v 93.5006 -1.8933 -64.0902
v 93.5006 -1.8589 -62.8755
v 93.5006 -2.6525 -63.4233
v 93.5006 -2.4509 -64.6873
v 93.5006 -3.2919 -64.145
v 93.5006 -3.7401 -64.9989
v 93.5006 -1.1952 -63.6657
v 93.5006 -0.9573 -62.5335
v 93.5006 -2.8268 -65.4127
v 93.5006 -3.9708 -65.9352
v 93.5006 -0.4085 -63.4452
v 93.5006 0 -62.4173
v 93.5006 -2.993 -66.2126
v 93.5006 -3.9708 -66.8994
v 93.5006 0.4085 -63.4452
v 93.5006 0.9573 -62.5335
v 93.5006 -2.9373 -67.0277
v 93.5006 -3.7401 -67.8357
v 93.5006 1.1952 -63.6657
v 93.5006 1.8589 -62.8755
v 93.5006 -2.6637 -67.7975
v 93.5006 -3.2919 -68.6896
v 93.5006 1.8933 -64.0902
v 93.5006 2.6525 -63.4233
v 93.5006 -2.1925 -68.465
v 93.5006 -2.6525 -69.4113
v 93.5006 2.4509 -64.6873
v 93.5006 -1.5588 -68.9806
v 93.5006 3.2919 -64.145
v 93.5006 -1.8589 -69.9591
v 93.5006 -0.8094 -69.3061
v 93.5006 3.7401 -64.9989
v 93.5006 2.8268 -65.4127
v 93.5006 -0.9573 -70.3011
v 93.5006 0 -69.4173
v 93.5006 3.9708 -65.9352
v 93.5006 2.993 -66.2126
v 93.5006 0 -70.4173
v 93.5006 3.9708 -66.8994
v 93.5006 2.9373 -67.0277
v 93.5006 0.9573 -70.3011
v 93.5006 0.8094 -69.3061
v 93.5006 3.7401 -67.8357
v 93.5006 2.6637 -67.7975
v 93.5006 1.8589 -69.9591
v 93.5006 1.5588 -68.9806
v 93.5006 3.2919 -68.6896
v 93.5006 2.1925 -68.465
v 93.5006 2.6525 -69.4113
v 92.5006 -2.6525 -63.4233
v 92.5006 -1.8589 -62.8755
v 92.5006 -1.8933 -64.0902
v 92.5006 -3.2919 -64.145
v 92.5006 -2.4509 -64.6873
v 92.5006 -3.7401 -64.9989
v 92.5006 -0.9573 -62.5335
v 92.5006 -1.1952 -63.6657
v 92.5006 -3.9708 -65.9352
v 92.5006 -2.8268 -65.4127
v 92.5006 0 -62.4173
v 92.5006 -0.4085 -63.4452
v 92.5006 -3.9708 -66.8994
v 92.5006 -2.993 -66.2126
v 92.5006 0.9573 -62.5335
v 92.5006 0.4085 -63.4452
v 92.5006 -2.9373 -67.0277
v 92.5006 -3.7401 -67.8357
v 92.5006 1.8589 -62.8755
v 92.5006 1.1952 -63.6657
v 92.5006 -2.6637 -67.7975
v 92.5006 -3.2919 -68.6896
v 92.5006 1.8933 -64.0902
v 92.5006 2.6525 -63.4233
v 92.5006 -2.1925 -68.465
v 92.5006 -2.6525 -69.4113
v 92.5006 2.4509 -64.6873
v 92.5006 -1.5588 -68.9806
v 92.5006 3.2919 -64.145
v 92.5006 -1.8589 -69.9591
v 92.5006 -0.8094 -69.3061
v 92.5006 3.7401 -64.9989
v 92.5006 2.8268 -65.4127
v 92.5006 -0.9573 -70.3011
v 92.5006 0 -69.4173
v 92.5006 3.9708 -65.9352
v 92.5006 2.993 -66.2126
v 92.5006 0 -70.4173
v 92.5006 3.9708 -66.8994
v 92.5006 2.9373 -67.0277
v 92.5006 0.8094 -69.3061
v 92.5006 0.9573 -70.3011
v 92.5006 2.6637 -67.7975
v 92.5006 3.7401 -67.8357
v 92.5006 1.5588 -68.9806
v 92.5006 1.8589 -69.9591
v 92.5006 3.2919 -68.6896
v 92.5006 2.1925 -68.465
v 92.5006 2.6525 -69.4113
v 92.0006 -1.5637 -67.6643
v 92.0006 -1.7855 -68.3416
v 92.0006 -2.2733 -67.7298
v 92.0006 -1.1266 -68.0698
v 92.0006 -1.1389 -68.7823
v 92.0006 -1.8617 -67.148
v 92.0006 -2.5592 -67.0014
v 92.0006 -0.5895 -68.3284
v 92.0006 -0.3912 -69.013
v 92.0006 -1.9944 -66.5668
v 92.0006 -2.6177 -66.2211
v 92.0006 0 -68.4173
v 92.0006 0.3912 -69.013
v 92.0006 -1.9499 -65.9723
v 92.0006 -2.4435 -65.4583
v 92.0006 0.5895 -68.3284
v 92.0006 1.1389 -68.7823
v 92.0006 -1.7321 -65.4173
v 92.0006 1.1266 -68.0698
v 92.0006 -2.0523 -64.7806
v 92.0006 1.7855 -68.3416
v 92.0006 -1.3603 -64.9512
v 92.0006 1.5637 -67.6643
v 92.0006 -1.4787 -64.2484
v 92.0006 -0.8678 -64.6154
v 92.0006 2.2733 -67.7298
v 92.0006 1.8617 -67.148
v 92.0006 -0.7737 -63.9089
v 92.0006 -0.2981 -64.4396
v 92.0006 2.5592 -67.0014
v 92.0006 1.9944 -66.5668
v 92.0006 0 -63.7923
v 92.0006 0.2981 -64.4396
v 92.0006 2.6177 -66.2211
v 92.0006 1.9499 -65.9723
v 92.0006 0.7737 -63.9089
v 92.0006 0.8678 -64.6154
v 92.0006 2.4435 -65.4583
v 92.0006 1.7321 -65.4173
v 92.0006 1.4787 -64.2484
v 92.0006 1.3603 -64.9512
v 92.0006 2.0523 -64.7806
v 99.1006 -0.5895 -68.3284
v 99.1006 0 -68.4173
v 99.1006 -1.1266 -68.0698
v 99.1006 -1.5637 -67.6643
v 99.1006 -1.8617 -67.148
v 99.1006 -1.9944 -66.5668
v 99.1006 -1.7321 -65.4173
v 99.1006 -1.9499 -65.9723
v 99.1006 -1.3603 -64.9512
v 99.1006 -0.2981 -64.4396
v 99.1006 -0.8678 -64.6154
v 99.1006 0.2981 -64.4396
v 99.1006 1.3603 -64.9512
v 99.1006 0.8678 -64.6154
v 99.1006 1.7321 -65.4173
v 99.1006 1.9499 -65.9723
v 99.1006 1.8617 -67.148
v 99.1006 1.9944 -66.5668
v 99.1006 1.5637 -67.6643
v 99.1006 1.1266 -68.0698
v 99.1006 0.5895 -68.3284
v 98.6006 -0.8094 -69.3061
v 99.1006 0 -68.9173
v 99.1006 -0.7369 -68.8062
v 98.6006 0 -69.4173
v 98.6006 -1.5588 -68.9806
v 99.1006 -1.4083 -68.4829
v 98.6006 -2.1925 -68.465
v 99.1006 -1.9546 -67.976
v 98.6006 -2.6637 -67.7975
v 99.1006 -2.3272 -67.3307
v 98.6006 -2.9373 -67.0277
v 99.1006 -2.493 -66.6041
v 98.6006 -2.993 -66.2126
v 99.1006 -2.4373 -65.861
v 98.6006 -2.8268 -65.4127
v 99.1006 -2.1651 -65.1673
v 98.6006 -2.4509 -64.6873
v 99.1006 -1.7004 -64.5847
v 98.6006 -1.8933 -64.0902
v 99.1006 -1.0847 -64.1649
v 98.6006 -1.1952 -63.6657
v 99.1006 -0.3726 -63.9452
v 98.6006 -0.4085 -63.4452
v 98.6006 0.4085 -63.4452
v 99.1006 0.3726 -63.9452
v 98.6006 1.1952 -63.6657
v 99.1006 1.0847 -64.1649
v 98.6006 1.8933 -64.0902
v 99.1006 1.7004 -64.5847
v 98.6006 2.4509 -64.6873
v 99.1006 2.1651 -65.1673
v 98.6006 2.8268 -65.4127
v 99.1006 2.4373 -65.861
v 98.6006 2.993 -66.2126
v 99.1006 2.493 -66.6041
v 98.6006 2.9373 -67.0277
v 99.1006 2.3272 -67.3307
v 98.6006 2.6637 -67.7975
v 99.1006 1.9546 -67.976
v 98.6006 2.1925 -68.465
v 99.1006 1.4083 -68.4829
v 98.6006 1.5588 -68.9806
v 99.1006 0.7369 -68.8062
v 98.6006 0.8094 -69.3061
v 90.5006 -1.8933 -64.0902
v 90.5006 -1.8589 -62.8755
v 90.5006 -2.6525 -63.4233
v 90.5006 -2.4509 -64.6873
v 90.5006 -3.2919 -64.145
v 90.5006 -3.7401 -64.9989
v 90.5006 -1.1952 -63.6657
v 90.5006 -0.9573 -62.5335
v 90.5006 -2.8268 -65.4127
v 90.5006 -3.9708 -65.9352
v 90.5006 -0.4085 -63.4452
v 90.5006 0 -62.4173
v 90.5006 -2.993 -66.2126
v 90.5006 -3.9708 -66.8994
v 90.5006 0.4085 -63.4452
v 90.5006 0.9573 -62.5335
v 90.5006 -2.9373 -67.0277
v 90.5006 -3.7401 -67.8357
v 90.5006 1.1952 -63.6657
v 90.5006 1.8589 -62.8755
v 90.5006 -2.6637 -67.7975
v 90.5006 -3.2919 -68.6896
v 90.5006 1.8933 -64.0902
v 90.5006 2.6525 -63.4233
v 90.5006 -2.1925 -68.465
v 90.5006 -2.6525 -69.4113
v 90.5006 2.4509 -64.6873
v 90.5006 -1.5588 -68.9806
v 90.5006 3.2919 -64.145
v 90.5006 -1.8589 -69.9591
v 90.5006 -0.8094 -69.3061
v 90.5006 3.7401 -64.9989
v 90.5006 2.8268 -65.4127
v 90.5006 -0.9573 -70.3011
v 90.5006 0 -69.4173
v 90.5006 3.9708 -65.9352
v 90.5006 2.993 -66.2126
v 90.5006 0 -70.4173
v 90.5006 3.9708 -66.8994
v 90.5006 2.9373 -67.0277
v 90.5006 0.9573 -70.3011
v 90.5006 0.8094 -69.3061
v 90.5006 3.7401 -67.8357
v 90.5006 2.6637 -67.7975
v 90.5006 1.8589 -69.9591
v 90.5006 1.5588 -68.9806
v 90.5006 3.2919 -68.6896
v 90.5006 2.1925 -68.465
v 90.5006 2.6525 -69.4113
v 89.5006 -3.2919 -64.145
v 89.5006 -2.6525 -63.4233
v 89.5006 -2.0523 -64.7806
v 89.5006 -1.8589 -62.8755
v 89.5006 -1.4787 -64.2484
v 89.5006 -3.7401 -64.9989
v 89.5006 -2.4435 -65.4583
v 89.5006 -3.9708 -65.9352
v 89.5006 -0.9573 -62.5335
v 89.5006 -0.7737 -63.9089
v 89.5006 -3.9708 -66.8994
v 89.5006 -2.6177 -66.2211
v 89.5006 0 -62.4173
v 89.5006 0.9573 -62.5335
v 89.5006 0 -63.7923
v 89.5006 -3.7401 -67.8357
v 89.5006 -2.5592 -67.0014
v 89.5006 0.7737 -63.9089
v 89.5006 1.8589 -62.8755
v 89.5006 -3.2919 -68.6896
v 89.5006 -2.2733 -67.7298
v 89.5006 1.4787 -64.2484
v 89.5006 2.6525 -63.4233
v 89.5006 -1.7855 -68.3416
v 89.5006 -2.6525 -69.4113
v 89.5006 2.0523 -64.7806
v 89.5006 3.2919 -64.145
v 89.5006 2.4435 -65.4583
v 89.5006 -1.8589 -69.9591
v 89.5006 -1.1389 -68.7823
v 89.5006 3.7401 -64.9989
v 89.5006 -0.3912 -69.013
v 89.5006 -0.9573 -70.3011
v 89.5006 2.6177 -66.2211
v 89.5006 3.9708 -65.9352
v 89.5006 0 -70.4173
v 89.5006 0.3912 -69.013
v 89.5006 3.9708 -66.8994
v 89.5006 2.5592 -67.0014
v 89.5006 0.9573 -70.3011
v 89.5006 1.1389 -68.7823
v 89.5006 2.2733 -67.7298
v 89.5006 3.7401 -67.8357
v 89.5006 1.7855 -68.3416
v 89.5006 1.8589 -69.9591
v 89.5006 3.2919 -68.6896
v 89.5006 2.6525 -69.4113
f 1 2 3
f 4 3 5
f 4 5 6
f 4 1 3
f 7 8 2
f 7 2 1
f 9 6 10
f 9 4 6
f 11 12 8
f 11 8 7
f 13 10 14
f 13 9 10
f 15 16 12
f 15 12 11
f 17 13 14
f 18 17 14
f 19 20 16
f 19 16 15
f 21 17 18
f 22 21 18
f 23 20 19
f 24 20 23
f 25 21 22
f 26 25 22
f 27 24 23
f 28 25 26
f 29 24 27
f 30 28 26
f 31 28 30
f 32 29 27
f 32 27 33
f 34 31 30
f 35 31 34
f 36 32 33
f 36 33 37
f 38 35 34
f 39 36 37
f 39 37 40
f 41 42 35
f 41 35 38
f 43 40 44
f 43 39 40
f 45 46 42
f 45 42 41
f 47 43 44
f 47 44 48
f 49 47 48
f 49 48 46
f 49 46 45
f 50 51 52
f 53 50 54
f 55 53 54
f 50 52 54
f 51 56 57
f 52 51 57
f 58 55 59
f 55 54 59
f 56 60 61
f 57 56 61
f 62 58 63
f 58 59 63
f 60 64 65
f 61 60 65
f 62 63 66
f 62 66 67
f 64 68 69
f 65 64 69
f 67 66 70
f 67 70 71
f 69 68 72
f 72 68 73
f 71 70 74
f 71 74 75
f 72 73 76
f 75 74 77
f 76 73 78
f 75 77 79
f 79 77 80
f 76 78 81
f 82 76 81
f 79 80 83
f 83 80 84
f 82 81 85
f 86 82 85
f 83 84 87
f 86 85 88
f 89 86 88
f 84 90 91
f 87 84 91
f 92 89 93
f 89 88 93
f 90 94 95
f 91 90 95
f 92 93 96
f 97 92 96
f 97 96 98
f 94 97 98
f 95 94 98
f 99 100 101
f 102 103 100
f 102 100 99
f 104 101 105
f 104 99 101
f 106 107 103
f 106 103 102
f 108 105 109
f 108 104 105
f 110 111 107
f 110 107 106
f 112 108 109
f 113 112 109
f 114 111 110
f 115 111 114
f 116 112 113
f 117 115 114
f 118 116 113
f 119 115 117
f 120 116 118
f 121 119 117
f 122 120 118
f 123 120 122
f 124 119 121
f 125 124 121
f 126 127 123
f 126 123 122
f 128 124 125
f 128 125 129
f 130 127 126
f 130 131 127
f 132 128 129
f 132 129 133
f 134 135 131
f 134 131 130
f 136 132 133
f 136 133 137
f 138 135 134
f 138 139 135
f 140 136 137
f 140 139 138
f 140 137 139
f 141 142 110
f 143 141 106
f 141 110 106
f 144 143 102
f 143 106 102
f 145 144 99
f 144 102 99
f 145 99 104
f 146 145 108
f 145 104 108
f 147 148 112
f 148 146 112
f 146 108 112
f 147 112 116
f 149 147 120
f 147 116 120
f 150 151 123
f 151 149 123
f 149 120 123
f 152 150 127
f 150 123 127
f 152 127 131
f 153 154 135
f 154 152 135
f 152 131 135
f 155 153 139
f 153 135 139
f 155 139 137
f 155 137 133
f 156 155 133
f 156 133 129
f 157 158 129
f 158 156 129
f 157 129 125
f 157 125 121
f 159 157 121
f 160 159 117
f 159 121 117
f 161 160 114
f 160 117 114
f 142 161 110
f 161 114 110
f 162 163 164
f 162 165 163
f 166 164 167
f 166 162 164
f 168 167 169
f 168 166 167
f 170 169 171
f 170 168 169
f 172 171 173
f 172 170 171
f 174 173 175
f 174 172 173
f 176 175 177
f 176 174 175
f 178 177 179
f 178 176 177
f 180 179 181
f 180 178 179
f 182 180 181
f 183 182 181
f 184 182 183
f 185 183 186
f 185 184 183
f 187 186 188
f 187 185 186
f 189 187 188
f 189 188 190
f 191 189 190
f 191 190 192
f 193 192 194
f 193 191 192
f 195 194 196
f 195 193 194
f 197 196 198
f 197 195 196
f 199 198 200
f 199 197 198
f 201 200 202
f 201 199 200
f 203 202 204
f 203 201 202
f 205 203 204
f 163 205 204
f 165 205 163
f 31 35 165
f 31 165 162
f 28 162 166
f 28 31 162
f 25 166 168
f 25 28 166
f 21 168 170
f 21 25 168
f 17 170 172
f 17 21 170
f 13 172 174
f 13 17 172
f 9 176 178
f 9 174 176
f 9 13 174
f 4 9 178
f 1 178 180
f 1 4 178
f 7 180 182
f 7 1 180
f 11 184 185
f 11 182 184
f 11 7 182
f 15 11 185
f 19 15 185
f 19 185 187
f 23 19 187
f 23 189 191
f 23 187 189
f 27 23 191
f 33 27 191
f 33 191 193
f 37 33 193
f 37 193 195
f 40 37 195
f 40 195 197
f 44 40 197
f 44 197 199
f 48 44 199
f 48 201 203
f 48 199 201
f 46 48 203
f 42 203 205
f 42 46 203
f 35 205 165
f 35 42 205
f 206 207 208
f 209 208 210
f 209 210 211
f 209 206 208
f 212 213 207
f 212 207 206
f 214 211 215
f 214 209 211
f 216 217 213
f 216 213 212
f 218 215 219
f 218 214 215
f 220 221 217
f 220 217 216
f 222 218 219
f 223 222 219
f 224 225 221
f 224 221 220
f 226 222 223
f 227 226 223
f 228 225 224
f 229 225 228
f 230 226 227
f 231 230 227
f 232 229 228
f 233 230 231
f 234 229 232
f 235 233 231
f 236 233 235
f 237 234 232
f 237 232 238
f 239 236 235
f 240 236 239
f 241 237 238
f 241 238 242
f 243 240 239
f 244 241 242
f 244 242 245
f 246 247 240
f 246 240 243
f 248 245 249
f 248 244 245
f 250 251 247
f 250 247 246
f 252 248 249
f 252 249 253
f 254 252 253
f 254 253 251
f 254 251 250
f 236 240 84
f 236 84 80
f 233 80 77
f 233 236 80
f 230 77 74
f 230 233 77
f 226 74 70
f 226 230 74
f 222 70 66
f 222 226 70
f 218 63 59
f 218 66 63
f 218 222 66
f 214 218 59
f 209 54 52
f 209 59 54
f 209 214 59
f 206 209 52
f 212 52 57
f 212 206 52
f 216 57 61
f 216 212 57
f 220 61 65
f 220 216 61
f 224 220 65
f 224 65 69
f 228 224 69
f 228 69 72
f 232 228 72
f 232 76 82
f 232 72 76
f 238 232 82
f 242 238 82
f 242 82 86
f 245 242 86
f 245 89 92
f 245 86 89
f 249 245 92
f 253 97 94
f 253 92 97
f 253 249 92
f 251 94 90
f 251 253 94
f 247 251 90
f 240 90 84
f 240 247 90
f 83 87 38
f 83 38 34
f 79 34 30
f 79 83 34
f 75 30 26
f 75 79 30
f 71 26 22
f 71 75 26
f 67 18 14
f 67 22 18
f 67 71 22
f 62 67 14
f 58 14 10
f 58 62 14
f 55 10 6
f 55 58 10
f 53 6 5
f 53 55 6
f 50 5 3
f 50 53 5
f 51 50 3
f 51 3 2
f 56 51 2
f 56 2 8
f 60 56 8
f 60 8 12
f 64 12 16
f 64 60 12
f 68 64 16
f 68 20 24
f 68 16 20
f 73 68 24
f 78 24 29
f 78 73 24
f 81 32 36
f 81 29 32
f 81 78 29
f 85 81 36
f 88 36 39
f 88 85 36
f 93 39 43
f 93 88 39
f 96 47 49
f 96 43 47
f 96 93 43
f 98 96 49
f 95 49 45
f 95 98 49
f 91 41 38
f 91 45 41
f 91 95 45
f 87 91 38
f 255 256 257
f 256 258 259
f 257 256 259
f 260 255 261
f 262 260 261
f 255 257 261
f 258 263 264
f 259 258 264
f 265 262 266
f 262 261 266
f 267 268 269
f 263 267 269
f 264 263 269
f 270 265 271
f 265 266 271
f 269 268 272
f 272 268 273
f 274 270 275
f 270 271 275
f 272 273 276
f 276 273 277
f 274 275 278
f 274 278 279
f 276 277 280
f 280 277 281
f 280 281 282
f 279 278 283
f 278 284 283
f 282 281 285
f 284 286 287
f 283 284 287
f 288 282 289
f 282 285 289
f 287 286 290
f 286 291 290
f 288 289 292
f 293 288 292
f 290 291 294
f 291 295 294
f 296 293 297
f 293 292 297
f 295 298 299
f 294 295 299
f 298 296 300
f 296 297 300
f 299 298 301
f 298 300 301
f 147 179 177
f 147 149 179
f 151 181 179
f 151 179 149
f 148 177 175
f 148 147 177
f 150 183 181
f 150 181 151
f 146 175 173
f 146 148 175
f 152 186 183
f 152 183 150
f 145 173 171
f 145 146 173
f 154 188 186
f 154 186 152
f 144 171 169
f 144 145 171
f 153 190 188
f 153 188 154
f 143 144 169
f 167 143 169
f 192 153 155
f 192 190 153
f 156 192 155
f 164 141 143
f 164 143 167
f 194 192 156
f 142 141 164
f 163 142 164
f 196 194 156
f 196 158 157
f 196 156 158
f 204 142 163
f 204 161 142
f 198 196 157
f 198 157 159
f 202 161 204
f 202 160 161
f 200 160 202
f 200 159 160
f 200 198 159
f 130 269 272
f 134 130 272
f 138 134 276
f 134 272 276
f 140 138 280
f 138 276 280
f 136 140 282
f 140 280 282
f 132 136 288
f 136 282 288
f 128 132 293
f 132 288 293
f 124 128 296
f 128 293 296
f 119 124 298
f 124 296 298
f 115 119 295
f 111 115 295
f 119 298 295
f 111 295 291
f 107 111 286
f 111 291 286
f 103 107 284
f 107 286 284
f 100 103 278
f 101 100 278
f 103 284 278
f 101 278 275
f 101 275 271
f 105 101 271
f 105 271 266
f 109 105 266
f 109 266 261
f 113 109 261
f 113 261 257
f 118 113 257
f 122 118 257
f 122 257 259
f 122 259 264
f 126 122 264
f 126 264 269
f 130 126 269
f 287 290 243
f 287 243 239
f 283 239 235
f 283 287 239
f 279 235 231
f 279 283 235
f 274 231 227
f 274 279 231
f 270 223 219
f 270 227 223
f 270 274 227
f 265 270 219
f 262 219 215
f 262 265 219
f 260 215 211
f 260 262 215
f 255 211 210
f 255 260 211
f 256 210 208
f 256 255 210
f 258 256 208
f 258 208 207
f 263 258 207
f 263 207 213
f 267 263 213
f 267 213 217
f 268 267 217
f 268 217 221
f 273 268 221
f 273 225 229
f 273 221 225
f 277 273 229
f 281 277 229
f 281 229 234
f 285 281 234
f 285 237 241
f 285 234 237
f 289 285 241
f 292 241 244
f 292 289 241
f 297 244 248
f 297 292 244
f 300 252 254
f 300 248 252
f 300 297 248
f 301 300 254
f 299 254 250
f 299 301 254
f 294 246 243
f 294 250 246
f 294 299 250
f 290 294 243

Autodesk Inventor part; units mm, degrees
ref_plane "YZ Plane" through (0, 0, 0) normal (1, 0, 0) x (0, 1, 0)
ref_plane "XZ Plane" through (0, 0, 0) normal (0, 1, 0) x (-1, 0, 0)
ref_plane "XY Plane" through (0, 0, 0) normal (0, 0, 1) x (1, 0, 0)
sketch "Boceto2" plane through (0, 0, 0) normal (0, 1, 0) x (-1, 0, 0)
  line L0 (99.3538, -66.4173) -> (-152.1277, -66.4173)
  line L1 (-90.5006, -68.4173) -> (-90.5006, -69.4173)
  line L2 (-89.5006, -69.4173) -> (-89.5006, -68.4173)
  line L3 (-92.5006, -68.4173) -> (-92.5006, -69.4173)
  line L4 (-99.1006, -68.4173) -> (-99.1006, -69.4173)
  line L5 (-99.1006, -69.4173) -> (-93.5006, -69.4173)
  line L6 (-93.5006, -70.4173) -> (-92.5006, -70.4173)
  line L7 (-92.5006, -70.4173) -> (-92.5006, -69.4173)
  line L8 (-90.5006, -69.4173) -> (-90.5006, -70.4173)
  line L9 (-90.5006, -70.4173) -> (-89.5006, -70.4173)
  line L10 (-89.5006, -70.4173) -> (-89.5006, -69.4173)
  line L11 (-93.5006, -68.4173) -> (-93.5006, -70.4173)
  line L12 (-92.5006, -69.4173) -> (-90.5006, -69.4173)
  line L13 (-99.1006, -68.4173) -> (-89.5006, -68.4173)
  point P0 (0, 0)
  dimension "d17" = 1
revolve "Revolución1" add sketch "Boceto2" angle 360 about axis through (-99.3538, 0, -66.4173) along (1, 0, 0)
chamfer "Chaflán2" distance 0.5 angle 45 1 edges at (99.1006, 0, -63.4173)
sketch "Boceto3" plane through (89.5006, 0, -66.4173) normal (-1, 0, 0) x (0, 0, 1)
  circle A0 centre (0, 0) radius 2.625
  point P0 (66.4173, 0)
  dimension "d28" = 5.25
extrude "Extrusión3" cut sketch "Boceto3" against normal blind 2.5
thread "Rosca3" size "M4x0.7" class "6H" standard "ISO Metric profile" length 7
properties part number "Tuerca remache m4" material "Aluminum 7175 T73 0 Hot Formed"
